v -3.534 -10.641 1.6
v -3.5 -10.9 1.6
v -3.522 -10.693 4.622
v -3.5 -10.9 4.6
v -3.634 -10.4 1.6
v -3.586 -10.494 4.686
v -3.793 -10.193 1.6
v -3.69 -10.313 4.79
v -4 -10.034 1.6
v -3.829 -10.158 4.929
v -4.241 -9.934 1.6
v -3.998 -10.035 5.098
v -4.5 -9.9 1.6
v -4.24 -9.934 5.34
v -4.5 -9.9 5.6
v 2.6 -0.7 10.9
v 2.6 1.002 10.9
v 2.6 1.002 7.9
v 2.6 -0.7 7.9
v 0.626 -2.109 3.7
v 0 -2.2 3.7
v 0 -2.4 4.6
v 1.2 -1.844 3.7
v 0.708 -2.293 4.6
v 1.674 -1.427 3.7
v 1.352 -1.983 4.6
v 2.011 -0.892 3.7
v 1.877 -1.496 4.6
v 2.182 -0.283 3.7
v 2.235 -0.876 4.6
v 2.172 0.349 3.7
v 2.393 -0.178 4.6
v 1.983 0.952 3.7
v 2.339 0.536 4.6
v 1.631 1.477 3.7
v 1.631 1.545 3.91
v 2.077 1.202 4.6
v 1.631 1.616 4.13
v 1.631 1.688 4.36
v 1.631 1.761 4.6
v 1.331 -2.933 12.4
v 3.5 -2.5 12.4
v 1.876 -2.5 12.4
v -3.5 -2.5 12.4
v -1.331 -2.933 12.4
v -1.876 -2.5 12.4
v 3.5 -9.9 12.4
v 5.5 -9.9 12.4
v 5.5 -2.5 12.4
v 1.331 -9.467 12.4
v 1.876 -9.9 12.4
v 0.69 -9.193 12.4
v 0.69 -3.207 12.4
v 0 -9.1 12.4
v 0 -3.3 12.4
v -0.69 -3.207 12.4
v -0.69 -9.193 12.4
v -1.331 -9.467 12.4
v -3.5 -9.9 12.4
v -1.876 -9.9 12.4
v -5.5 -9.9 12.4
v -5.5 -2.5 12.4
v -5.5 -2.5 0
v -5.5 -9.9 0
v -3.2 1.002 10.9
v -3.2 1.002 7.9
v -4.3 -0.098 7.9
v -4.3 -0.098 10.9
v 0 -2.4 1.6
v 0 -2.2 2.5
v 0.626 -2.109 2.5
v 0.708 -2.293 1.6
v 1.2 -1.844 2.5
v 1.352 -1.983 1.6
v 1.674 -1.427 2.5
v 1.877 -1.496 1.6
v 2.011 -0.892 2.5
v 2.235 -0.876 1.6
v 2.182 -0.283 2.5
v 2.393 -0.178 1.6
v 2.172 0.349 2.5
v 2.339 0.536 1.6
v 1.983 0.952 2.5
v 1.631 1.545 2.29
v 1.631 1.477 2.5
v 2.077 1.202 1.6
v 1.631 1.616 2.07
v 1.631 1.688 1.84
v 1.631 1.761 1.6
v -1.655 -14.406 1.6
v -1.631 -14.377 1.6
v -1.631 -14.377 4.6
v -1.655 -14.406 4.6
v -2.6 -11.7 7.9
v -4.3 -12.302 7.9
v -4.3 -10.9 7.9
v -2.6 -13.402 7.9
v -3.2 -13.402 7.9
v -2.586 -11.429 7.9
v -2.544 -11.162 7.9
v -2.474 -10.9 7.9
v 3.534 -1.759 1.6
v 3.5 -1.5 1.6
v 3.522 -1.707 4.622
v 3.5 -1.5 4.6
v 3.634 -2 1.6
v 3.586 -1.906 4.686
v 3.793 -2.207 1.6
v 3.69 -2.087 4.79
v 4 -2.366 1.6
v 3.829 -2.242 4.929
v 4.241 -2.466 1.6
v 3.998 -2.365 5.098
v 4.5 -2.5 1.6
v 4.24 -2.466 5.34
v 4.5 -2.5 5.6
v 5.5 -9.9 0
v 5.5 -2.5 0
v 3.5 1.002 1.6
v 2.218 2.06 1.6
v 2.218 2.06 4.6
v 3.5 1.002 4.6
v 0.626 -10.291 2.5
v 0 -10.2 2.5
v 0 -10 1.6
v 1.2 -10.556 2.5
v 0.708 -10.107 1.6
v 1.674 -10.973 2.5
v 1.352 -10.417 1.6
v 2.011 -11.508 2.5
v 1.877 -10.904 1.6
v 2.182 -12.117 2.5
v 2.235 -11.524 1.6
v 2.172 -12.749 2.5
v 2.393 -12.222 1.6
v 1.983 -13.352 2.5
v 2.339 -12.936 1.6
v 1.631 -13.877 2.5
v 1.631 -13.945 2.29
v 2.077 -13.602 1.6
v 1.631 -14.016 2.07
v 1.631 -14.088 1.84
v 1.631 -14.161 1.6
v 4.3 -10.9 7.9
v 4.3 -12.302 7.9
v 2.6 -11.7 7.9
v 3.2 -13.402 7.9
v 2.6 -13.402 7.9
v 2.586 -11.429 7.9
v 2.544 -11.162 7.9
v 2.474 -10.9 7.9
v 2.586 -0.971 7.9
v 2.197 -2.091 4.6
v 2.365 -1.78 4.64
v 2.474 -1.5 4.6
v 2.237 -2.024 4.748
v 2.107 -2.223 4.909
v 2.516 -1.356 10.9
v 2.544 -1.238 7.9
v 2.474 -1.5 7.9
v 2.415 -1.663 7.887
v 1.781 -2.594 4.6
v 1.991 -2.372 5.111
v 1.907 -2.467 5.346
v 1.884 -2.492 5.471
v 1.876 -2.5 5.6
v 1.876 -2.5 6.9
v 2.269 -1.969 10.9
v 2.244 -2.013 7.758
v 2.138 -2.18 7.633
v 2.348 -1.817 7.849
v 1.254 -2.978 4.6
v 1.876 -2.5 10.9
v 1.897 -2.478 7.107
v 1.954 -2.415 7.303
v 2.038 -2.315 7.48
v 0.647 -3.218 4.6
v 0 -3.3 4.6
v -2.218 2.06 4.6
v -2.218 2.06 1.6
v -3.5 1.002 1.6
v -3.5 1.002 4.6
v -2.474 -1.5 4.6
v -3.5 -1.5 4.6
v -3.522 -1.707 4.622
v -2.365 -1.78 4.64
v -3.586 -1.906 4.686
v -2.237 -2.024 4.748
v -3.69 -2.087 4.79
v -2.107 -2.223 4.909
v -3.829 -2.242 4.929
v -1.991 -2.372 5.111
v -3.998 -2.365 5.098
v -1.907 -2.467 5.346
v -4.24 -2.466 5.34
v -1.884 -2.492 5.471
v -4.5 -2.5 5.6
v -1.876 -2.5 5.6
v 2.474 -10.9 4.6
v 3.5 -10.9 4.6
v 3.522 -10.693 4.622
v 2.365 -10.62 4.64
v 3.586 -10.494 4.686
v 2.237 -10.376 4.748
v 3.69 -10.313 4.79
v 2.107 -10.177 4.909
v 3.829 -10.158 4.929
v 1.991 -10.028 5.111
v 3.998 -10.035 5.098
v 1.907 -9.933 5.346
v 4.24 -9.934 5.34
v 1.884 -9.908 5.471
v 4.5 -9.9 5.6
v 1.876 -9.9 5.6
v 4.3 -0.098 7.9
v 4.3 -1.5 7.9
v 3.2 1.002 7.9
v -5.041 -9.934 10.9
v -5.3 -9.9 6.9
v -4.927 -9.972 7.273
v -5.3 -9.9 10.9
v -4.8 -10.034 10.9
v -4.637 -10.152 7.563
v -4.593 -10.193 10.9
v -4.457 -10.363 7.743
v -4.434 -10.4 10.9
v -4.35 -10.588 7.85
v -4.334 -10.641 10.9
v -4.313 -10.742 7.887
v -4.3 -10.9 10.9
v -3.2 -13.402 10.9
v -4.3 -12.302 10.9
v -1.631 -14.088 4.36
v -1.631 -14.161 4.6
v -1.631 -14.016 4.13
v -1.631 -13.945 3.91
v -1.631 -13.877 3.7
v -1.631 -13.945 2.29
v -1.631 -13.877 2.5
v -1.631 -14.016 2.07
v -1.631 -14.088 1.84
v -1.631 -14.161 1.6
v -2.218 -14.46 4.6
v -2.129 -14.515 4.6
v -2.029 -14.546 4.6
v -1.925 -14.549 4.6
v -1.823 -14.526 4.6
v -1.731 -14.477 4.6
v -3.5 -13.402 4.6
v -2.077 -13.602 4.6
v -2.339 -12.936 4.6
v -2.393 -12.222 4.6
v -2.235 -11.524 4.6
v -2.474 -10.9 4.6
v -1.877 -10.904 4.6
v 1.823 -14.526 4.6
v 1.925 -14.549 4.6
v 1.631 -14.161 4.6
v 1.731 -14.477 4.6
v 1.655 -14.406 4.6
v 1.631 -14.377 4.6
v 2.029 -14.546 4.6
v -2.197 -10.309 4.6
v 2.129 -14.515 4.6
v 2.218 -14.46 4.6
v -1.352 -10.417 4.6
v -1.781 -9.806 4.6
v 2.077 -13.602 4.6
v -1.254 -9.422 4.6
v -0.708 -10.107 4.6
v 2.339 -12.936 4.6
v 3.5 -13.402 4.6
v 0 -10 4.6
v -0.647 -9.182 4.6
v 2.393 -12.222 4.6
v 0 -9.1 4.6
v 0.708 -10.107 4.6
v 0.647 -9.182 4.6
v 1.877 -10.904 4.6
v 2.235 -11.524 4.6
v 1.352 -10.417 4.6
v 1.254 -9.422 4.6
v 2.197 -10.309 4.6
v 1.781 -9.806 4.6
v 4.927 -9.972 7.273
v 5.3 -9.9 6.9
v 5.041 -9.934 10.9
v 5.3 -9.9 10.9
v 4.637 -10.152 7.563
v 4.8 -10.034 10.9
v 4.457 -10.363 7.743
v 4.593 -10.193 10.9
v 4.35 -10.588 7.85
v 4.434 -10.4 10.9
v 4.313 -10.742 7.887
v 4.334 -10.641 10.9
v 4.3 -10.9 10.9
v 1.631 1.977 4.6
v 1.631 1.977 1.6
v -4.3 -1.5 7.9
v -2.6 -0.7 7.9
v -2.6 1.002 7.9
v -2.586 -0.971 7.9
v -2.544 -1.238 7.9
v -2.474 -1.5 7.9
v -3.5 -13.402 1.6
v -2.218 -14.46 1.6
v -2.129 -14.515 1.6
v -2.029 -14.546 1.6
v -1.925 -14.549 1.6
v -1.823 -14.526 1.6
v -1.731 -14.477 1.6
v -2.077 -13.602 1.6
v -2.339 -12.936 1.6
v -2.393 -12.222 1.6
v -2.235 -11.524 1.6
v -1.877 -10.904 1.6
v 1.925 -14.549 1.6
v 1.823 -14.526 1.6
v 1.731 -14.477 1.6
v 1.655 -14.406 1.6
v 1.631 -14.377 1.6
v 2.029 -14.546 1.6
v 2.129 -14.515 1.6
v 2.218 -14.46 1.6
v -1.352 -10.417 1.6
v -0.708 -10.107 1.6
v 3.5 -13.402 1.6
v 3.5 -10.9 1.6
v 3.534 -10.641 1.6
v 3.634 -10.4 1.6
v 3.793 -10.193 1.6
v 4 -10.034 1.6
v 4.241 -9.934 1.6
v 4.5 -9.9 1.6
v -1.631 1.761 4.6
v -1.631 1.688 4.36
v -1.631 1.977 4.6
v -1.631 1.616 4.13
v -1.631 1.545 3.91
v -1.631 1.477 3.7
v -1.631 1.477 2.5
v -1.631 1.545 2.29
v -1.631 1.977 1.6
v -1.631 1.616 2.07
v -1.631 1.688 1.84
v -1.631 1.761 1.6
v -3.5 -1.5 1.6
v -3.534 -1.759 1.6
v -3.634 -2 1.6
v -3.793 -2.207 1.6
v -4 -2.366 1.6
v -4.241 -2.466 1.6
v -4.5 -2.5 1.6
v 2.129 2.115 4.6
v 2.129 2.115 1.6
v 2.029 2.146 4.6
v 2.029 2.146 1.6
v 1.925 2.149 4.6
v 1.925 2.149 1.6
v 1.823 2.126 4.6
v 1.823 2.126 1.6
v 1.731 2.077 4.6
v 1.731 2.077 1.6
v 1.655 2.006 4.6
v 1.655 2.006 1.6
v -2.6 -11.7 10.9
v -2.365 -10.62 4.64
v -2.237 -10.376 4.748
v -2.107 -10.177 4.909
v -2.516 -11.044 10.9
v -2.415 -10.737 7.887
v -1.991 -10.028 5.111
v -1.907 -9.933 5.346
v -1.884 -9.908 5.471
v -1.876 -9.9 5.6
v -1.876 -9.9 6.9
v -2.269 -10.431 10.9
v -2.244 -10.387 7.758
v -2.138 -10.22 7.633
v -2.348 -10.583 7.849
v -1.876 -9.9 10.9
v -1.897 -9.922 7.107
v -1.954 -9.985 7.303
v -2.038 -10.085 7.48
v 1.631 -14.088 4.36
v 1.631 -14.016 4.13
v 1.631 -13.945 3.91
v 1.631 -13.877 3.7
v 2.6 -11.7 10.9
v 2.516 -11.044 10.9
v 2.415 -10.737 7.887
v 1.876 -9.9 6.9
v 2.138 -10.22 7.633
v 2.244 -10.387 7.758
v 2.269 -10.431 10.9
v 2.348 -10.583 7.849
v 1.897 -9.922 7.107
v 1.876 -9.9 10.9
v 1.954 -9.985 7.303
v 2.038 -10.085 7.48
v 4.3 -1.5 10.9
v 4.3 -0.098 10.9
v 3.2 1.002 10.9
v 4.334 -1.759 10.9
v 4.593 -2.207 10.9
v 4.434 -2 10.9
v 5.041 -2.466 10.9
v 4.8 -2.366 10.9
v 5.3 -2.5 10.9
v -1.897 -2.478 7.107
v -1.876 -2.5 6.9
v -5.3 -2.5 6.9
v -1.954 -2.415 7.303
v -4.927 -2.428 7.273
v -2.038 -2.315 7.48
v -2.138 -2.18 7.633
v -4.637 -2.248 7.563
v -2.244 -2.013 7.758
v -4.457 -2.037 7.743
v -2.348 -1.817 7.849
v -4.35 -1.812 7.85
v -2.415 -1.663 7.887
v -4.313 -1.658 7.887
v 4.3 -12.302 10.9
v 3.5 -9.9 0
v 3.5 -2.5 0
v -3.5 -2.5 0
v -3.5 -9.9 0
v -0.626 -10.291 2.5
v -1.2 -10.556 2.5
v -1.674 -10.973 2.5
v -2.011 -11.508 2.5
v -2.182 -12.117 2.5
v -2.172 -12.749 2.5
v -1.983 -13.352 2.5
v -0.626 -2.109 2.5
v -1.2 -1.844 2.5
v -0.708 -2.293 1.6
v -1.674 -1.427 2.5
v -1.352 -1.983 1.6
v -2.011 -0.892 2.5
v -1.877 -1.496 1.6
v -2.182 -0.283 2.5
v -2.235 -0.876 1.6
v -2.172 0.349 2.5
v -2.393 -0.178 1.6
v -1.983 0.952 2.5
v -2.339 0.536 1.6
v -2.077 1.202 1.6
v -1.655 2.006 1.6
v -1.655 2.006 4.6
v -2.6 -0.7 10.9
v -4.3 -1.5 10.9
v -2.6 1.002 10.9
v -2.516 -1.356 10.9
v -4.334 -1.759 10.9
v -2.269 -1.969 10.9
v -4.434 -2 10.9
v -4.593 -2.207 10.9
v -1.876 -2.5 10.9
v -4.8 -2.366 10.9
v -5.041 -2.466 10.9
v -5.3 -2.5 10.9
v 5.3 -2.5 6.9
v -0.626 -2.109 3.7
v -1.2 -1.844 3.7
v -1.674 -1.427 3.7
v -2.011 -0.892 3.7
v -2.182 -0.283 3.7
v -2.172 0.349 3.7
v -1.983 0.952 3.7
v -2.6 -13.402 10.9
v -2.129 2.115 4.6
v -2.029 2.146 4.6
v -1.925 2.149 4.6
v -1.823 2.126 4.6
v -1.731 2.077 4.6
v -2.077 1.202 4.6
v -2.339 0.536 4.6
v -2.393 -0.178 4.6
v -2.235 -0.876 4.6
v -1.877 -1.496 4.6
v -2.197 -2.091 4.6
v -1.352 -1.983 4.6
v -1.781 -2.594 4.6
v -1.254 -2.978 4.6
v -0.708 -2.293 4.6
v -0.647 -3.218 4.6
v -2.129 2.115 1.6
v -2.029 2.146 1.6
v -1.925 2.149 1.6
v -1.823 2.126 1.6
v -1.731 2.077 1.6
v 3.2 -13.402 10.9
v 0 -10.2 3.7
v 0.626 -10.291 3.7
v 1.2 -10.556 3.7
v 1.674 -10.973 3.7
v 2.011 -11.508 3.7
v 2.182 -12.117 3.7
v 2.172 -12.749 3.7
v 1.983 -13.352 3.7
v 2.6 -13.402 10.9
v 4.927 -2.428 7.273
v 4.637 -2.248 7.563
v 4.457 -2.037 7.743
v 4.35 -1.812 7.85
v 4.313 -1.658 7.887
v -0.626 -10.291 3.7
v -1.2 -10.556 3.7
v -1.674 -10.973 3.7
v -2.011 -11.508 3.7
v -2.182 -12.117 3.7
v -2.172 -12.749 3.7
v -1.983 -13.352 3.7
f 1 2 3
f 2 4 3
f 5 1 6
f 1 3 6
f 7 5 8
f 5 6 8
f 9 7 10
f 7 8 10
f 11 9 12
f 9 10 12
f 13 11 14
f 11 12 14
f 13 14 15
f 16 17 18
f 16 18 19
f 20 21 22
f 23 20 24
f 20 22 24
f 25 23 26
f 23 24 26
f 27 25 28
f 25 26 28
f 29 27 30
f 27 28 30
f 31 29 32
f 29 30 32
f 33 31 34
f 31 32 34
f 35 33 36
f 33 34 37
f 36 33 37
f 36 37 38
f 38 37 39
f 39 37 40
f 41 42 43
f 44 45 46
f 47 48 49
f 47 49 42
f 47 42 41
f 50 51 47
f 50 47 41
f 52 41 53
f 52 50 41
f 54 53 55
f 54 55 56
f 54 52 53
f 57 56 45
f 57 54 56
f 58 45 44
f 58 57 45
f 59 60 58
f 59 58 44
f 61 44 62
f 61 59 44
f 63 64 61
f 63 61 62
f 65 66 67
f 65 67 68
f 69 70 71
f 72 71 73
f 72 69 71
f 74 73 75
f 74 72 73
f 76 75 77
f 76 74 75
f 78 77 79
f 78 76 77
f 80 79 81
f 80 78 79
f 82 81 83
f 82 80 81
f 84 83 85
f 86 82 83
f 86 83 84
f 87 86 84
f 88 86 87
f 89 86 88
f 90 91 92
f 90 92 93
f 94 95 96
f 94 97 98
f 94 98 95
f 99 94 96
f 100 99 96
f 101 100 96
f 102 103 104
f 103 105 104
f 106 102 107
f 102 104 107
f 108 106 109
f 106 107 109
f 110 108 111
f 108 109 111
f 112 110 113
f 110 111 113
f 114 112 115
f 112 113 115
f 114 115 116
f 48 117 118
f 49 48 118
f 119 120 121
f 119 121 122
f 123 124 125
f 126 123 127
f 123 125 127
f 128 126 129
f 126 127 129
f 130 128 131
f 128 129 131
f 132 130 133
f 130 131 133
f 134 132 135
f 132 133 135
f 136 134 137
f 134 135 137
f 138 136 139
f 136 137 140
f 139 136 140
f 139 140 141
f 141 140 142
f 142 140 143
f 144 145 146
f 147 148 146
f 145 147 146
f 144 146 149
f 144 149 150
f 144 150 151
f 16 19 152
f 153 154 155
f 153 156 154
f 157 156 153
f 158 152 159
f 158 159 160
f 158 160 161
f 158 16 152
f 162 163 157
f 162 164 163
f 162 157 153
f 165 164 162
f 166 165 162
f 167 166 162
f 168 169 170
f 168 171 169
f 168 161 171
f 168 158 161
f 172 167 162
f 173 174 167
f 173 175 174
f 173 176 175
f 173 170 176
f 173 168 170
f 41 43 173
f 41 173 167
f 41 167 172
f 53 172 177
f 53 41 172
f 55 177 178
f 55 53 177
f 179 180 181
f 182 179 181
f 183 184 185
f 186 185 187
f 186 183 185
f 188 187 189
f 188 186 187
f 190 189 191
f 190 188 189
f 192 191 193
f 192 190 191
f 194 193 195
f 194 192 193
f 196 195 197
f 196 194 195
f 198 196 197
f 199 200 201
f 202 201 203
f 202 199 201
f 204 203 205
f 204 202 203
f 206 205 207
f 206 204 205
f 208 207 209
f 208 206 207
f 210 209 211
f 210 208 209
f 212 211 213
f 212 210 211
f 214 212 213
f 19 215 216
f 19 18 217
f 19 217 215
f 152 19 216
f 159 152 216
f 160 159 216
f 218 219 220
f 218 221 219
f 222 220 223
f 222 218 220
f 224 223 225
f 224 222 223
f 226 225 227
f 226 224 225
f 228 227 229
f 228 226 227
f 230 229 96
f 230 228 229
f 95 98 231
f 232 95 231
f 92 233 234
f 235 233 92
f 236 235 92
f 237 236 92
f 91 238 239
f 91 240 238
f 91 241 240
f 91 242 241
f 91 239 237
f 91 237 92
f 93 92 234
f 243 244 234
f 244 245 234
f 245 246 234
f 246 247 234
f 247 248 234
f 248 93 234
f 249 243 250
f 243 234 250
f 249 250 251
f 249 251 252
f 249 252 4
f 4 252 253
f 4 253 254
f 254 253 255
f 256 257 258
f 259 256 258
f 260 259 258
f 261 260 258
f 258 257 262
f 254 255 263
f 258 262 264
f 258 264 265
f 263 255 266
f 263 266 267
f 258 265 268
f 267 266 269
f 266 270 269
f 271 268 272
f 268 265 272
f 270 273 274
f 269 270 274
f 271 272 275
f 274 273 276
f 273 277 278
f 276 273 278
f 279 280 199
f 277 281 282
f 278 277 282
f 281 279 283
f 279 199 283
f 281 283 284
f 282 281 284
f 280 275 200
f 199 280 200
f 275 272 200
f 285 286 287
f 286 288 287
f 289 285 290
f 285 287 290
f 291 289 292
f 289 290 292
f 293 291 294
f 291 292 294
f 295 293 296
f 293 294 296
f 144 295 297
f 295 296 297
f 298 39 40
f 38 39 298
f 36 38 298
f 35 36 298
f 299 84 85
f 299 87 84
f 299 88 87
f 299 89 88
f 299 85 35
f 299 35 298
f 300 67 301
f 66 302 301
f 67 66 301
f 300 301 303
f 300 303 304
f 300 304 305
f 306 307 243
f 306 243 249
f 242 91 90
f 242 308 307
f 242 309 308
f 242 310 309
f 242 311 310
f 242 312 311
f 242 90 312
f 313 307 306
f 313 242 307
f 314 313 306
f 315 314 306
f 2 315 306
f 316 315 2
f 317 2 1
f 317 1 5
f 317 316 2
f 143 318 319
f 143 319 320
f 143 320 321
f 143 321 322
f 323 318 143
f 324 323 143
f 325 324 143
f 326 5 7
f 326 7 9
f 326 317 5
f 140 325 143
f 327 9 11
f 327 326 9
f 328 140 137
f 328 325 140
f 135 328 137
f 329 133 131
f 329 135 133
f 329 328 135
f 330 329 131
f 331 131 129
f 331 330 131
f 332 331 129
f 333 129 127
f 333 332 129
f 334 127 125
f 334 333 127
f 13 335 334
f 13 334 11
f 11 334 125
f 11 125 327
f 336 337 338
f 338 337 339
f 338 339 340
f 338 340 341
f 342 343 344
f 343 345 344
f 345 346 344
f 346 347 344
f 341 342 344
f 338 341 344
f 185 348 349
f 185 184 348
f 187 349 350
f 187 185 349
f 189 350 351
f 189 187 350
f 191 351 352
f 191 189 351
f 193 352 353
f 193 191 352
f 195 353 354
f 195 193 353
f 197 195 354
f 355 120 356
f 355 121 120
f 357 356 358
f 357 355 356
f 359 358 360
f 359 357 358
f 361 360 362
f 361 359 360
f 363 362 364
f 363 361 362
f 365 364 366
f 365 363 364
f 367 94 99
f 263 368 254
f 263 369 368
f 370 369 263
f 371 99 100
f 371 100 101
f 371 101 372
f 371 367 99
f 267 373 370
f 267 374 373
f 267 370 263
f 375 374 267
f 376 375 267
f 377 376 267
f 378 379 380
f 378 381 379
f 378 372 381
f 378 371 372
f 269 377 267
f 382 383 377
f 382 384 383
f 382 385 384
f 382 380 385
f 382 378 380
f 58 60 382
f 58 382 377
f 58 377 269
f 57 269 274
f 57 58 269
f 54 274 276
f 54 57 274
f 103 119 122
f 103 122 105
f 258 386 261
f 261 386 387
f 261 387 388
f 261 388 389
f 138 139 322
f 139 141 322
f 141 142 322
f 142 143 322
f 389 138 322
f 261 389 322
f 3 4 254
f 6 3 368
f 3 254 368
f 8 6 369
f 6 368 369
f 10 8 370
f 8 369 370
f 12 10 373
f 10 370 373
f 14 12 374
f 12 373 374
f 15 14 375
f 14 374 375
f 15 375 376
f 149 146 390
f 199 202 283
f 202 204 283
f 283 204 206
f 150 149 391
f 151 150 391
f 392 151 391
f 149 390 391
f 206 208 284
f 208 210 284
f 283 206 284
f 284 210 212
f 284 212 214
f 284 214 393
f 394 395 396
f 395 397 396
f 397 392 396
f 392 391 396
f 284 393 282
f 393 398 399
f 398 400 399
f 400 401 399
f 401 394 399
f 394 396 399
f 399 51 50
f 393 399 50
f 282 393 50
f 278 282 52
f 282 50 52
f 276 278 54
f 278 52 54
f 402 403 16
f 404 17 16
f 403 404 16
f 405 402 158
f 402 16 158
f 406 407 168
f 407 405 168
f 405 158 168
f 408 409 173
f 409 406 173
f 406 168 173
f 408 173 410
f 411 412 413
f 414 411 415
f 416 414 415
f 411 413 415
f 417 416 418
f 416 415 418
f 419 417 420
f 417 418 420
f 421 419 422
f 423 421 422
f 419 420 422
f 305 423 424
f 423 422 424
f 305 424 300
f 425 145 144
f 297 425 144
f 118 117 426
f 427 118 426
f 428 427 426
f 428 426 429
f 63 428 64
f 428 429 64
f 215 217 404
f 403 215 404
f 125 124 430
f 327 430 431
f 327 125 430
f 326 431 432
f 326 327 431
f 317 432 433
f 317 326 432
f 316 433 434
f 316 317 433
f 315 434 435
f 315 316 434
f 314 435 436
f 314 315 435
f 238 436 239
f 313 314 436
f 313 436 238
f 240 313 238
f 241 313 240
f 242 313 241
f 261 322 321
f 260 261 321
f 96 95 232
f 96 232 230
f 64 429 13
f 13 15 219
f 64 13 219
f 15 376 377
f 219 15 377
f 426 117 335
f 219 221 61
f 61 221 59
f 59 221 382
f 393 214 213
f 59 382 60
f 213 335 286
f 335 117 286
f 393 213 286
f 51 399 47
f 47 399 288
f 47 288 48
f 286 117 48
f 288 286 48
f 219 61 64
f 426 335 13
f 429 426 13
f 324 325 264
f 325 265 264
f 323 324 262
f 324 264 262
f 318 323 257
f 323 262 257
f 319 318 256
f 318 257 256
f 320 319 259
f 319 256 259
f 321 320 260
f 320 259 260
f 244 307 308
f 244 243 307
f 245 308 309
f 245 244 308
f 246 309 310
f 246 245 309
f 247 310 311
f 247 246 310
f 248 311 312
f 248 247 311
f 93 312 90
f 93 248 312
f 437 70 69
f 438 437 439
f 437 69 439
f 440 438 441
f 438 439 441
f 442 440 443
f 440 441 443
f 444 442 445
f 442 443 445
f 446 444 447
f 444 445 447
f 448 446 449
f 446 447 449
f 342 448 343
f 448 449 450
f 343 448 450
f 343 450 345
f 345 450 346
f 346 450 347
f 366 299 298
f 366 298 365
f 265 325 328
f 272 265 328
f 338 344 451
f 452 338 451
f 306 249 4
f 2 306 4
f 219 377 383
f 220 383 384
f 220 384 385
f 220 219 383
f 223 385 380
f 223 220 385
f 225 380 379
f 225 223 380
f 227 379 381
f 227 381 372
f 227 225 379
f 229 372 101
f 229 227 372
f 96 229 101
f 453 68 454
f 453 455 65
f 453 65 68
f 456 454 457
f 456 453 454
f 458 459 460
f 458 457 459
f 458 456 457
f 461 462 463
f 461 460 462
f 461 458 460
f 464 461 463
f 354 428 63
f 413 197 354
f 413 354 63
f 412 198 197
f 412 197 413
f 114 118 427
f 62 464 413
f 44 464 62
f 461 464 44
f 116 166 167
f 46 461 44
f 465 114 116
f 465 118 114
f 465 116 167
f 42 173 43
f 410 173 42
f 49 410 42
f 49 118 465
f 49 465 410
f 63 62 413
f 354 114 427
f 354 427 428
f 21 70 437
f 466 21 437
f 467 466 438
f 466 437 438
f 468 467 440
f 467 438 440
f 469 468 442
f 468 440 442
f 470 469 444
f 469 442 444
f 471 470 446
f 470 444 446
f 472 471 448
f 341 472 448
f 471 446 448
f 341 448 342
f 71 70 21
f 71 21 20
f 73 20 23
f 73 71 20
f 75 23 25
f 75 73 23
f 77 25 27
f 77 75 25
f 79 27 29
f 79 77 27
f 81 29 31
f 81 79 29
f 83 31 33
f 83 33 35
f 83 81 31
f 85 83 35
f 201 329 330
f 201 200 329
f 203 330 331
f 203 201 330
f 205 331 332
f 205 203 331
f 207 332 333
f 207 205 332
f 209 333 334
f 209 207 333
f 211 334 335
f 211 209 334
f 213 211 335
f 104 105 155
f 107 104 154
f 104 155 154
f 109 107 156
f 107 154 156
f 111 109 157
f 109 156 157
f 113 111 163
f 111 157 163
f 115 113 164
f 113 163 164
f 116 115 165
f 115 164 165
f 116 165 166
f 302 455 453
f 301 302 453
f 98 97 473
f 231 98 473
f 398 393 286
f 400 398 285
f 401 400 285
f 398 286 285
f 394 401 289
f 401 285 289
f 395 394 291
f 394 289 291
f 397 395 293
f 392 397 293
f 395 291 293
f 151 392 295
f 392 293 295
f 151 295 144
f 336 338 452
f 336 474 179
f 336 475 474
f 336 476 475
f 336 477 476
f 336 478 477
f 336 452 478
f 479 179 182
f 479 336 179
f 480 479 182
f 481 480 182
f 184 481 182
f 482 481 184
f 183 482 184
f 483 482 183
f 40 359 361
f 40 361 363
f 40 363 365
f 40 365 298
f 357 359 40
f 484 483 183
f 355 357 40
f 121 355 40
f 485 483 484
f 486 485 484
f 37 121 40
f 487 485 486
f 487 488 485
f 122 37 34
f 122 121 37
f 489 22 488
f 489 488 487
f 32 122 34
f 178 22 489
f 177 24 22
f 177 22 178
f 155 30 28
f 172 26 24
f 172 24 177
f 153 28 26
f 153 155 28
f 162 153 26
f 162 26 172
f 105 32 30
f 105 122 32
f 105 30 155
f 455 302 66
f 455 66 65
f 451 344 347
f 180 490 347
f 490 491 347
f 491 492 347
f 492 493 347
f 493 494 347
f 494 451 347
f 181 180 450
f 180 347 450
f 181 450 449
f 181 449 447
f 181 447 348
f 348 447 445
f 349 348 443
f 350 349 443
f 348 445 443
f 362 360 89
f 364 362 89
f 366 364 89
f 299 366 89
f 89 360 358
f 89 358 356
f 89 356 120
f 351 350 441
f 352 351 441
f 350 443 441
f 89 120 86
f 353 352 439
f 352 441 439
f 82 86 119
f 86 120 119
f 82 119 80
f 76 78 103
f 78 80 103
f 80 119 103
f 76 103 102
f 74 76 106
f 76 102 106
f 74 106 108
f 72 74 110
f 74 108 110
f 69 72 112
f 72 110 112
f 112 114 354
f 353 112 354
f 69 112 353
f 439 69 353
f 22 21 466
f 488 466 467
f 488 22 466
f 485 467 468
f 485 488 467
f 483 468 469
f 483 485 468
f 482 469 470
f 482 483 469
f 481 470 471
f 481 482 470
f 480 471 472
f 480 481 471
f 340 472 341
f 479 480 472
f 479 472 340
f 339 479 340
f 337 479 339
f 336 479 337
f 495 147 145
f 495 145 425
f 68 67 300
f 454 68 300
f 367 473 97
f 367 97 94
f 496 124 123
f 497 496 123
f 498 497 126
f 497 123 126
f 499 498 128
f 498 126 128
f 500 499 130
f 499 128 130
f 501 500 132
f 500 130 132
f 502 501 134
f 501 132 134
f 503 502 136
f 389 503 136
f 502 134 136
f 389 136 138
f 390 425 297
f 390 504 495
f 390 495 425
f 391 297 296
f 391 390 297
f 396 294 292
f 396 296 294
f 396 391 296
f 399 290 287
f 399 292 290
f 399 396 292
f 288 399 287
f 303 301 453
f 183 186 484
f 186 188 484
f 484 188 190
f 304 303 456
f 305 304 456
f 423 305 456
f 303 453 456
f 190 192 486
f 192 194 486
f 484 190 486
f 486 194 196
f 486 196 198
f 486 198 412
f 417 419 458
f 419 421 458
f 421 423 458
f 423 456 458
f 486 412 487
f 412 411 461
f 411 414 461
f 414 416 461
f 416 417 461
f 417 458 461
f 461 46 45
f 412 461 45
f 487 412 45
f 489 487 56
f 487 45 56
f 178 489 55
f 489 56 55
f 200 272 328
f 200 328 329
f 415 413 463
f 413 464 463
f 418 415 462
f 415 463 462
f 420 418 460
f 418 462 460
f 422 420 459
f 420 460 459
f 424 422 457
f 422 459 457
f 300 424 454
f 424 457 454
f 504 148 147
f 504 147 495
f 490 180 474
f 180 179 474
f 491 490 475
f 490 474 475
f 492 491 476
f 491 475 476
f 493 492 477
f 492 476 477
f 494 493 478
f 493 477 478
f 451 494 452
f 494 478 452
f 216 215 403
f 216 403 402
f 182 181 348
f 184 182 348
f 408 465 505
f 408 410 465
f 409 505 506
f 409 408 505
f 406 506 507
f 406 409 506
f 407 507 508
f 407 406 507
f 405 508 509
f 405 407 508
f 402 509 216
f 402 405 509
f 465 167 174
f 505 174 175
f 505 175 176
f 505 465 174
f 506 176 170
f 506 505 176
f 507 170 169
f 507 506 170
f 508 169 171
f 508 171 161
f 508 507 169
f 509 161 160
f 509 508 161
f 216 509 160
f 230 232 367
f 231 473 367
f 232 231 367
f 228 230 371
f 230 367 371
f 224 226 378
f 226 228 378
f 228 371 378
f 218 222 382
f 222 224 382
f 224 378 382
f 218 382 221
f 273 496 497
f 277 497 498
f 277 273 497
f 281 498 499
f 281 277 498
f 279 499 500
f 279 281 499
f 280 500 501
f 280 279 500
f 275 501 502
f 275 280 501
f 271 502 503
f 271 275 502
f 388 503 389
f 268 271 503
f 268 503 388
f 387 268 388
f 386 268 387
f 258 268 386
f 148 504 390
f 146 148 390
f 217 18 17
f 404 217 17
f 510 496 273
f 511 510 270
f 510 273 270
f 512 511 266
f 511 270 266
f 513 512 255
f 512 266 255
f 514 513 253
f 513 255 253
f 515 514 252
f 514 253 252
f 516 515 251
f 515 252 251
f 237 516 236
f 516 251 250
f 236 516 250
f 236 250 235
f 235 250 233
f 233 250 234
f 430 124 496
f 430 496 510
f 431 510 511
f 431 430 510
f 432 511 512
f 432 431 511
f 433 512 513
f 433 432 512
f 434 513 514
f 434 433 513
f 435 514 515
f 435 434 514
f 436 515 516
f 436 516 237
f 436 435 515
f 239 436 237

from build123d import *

# Parameters (mm, degrees)
F1_DEPTH  = 12.4
F2_W      = 4.8141676475
F2_H      = 3.3
F2_H_2    = 1.6
F2_H_3    = 1.5
F3_DEPTH  = 25
F5_DEPTH  = 7.8
F6_DEPTH  = 0.8
F7_SIZE   = 1.1
F8_R      = 0.4
F9_R      = 1
F10_SIZE2 = 0.2
F10_SIZE  = 0.9


# Not quite as in the source:
# - a feature of the source that left no trace in its solid (it failed there, or was rolled back) is left out


with BuildPart() as f1:
    # F0 (on Top) → F1 (new body)
    with BuildSketch(Plane.XY):
        with BuildLine():
            ThreePointArc((0, -2.2), (-2.0110712703, -0.8919598342), (-1.6307225426, 1.476734231))
            Line((-1.6307225426, 1.476734231), (-1.6307225426, 1.976734231))
            Line((-1.6307225426, 1.976734231), (-1.9090909091, 2.3141676475))
            Line((-1.9090909091, 2.3141676475), (-3.5, 1.0017346067))
            Line((-3.5, 1.0017346067), (-3.5, -2.5))
            Line((-3.5, -2.5), (-5.5, -2.5))
            Line((-5.5, -2.5), (-5.5, -6.2))
            Line((-5.5, -6.2), (0, -6.2))
            Line((0, -6.2), (0, -2.2))
        make_face()
    extrude(amount=F1_DEPTH)

    # F2 (on face) → F3 (cut)
    with BuildSketch(Plane(origin=(-3.5, 0, 0), x_dir=(0, -1, 0), z_dir=(-1, 0, 0))):
        with Locations((0.0929161762, 6.25)):
            Rectangle(F2_W, F2_H)
        with Locations((0.0929161762, 0.8)):
            Rectangle(F2_W, F2_H_2)
        with Locations((0.0929161762, 11.65)):
            Rectangle(F2_W, F2_H_3)
    extrude(amount=-F3_DEPTH, mode=Mode.SUBTRACT)

    # F4 (on face) → F5 (cut, through all)
    with BuildSketch(Plane.XY.offset(12.4)):
        with BuildLine():
            Line((-2.6, 1.0017346067), (-2.6, -0.7))
            ThreePointArc((-2.6, -0.7), (-1.8384776311, -2.5384776311), (0, -3.3))
            Line((0, -3.3), (0, -2.2))
            ThreePointArc((0, -2.2), (-2.0110712703, -0.8919598342), (-1.6307225426, 1.476734231))
            Line((-1.6307225426, 1.476734231), (-1.6307225426, 1.976734231))
            Line((-1.6307225426, 1.976734231), (-1.9090909091, 2.3141676475))
            Line((-1.9090909091, 2.3141676475), (-3.5, 1.0017346067))
            Line((-3.5, 1.0017346067), (-2.6, 1.0017346067))
        make_face()
    extrude(amount=-F5_DEPTH, mode=Mode.SUBTRACT)

    # F6 (add): a face of the model
    f6_faces = [f1.faces().sort_by_distance(p)[0] for p in [
        (-3.5, -0.7491326967, 9.4),
    ]]
    extrude(f6_faces, amount=F6_DEPTH)

    # F7
    f7_edges = [f1.edges().sort_by_distance(p)[0] for p in [
        (-4.3, 1.001735, 9.4),
    ]]
    chamfer(f7_edges, length=F7_SIZE)

    # F8
    f8_edges = [f1.edges().sort_by_distance(p)[0] for p in [
        (-1.909091, 2.314168, 3.1),
    ]]
    fillet(f8_edges, radius=F8_R)

    # F9
    f9_edges = [f1.edges().sort_by_distance(p)[0] for p in [
        (-3.5, -2.5, 3.1),
        (-2.688083, -2.5, 4.6),
        (-3.088083, -2.5, 7.9),
        (-4.3, -2.5, 9.4),
    ]]
    fillet(f9_edges, radius=F9_R)

    # F10
    f10_edges = [f1.edges().sort_by_distance(p)[0] for p in [
        (-2.011071, -0.89196, 1.6),
        (-2.011071, -0.89196, 4.6),
    ]]
    f10_side = f1.faces().sort_by_distance((-2.011071, -0.89196, 3.1))[0]
    chamfer(f10_edges, length=F10_SIZE, length2=F10_SIZE2, reference=f10_side)

    # F11: F1 across face


with BuildPart() as f1_1:
    add(f1.part)
    add(f1.part.mirror(Plane(origin=(0, -4.5388751239, 5.7890981169), x_dir=(0, 1, 0), z_dir=(1, 0, 0))))

    # F12: F1 across face


with BuildPart() as f1_2:
    add(f1_1.part)
    add(f1_1.part.mirror(Plane(origin=(0, -6.2, 6.2), x_dir=(1, 0, 0), z_dir=(0, -1, 0))))


solid = f1_2.part
